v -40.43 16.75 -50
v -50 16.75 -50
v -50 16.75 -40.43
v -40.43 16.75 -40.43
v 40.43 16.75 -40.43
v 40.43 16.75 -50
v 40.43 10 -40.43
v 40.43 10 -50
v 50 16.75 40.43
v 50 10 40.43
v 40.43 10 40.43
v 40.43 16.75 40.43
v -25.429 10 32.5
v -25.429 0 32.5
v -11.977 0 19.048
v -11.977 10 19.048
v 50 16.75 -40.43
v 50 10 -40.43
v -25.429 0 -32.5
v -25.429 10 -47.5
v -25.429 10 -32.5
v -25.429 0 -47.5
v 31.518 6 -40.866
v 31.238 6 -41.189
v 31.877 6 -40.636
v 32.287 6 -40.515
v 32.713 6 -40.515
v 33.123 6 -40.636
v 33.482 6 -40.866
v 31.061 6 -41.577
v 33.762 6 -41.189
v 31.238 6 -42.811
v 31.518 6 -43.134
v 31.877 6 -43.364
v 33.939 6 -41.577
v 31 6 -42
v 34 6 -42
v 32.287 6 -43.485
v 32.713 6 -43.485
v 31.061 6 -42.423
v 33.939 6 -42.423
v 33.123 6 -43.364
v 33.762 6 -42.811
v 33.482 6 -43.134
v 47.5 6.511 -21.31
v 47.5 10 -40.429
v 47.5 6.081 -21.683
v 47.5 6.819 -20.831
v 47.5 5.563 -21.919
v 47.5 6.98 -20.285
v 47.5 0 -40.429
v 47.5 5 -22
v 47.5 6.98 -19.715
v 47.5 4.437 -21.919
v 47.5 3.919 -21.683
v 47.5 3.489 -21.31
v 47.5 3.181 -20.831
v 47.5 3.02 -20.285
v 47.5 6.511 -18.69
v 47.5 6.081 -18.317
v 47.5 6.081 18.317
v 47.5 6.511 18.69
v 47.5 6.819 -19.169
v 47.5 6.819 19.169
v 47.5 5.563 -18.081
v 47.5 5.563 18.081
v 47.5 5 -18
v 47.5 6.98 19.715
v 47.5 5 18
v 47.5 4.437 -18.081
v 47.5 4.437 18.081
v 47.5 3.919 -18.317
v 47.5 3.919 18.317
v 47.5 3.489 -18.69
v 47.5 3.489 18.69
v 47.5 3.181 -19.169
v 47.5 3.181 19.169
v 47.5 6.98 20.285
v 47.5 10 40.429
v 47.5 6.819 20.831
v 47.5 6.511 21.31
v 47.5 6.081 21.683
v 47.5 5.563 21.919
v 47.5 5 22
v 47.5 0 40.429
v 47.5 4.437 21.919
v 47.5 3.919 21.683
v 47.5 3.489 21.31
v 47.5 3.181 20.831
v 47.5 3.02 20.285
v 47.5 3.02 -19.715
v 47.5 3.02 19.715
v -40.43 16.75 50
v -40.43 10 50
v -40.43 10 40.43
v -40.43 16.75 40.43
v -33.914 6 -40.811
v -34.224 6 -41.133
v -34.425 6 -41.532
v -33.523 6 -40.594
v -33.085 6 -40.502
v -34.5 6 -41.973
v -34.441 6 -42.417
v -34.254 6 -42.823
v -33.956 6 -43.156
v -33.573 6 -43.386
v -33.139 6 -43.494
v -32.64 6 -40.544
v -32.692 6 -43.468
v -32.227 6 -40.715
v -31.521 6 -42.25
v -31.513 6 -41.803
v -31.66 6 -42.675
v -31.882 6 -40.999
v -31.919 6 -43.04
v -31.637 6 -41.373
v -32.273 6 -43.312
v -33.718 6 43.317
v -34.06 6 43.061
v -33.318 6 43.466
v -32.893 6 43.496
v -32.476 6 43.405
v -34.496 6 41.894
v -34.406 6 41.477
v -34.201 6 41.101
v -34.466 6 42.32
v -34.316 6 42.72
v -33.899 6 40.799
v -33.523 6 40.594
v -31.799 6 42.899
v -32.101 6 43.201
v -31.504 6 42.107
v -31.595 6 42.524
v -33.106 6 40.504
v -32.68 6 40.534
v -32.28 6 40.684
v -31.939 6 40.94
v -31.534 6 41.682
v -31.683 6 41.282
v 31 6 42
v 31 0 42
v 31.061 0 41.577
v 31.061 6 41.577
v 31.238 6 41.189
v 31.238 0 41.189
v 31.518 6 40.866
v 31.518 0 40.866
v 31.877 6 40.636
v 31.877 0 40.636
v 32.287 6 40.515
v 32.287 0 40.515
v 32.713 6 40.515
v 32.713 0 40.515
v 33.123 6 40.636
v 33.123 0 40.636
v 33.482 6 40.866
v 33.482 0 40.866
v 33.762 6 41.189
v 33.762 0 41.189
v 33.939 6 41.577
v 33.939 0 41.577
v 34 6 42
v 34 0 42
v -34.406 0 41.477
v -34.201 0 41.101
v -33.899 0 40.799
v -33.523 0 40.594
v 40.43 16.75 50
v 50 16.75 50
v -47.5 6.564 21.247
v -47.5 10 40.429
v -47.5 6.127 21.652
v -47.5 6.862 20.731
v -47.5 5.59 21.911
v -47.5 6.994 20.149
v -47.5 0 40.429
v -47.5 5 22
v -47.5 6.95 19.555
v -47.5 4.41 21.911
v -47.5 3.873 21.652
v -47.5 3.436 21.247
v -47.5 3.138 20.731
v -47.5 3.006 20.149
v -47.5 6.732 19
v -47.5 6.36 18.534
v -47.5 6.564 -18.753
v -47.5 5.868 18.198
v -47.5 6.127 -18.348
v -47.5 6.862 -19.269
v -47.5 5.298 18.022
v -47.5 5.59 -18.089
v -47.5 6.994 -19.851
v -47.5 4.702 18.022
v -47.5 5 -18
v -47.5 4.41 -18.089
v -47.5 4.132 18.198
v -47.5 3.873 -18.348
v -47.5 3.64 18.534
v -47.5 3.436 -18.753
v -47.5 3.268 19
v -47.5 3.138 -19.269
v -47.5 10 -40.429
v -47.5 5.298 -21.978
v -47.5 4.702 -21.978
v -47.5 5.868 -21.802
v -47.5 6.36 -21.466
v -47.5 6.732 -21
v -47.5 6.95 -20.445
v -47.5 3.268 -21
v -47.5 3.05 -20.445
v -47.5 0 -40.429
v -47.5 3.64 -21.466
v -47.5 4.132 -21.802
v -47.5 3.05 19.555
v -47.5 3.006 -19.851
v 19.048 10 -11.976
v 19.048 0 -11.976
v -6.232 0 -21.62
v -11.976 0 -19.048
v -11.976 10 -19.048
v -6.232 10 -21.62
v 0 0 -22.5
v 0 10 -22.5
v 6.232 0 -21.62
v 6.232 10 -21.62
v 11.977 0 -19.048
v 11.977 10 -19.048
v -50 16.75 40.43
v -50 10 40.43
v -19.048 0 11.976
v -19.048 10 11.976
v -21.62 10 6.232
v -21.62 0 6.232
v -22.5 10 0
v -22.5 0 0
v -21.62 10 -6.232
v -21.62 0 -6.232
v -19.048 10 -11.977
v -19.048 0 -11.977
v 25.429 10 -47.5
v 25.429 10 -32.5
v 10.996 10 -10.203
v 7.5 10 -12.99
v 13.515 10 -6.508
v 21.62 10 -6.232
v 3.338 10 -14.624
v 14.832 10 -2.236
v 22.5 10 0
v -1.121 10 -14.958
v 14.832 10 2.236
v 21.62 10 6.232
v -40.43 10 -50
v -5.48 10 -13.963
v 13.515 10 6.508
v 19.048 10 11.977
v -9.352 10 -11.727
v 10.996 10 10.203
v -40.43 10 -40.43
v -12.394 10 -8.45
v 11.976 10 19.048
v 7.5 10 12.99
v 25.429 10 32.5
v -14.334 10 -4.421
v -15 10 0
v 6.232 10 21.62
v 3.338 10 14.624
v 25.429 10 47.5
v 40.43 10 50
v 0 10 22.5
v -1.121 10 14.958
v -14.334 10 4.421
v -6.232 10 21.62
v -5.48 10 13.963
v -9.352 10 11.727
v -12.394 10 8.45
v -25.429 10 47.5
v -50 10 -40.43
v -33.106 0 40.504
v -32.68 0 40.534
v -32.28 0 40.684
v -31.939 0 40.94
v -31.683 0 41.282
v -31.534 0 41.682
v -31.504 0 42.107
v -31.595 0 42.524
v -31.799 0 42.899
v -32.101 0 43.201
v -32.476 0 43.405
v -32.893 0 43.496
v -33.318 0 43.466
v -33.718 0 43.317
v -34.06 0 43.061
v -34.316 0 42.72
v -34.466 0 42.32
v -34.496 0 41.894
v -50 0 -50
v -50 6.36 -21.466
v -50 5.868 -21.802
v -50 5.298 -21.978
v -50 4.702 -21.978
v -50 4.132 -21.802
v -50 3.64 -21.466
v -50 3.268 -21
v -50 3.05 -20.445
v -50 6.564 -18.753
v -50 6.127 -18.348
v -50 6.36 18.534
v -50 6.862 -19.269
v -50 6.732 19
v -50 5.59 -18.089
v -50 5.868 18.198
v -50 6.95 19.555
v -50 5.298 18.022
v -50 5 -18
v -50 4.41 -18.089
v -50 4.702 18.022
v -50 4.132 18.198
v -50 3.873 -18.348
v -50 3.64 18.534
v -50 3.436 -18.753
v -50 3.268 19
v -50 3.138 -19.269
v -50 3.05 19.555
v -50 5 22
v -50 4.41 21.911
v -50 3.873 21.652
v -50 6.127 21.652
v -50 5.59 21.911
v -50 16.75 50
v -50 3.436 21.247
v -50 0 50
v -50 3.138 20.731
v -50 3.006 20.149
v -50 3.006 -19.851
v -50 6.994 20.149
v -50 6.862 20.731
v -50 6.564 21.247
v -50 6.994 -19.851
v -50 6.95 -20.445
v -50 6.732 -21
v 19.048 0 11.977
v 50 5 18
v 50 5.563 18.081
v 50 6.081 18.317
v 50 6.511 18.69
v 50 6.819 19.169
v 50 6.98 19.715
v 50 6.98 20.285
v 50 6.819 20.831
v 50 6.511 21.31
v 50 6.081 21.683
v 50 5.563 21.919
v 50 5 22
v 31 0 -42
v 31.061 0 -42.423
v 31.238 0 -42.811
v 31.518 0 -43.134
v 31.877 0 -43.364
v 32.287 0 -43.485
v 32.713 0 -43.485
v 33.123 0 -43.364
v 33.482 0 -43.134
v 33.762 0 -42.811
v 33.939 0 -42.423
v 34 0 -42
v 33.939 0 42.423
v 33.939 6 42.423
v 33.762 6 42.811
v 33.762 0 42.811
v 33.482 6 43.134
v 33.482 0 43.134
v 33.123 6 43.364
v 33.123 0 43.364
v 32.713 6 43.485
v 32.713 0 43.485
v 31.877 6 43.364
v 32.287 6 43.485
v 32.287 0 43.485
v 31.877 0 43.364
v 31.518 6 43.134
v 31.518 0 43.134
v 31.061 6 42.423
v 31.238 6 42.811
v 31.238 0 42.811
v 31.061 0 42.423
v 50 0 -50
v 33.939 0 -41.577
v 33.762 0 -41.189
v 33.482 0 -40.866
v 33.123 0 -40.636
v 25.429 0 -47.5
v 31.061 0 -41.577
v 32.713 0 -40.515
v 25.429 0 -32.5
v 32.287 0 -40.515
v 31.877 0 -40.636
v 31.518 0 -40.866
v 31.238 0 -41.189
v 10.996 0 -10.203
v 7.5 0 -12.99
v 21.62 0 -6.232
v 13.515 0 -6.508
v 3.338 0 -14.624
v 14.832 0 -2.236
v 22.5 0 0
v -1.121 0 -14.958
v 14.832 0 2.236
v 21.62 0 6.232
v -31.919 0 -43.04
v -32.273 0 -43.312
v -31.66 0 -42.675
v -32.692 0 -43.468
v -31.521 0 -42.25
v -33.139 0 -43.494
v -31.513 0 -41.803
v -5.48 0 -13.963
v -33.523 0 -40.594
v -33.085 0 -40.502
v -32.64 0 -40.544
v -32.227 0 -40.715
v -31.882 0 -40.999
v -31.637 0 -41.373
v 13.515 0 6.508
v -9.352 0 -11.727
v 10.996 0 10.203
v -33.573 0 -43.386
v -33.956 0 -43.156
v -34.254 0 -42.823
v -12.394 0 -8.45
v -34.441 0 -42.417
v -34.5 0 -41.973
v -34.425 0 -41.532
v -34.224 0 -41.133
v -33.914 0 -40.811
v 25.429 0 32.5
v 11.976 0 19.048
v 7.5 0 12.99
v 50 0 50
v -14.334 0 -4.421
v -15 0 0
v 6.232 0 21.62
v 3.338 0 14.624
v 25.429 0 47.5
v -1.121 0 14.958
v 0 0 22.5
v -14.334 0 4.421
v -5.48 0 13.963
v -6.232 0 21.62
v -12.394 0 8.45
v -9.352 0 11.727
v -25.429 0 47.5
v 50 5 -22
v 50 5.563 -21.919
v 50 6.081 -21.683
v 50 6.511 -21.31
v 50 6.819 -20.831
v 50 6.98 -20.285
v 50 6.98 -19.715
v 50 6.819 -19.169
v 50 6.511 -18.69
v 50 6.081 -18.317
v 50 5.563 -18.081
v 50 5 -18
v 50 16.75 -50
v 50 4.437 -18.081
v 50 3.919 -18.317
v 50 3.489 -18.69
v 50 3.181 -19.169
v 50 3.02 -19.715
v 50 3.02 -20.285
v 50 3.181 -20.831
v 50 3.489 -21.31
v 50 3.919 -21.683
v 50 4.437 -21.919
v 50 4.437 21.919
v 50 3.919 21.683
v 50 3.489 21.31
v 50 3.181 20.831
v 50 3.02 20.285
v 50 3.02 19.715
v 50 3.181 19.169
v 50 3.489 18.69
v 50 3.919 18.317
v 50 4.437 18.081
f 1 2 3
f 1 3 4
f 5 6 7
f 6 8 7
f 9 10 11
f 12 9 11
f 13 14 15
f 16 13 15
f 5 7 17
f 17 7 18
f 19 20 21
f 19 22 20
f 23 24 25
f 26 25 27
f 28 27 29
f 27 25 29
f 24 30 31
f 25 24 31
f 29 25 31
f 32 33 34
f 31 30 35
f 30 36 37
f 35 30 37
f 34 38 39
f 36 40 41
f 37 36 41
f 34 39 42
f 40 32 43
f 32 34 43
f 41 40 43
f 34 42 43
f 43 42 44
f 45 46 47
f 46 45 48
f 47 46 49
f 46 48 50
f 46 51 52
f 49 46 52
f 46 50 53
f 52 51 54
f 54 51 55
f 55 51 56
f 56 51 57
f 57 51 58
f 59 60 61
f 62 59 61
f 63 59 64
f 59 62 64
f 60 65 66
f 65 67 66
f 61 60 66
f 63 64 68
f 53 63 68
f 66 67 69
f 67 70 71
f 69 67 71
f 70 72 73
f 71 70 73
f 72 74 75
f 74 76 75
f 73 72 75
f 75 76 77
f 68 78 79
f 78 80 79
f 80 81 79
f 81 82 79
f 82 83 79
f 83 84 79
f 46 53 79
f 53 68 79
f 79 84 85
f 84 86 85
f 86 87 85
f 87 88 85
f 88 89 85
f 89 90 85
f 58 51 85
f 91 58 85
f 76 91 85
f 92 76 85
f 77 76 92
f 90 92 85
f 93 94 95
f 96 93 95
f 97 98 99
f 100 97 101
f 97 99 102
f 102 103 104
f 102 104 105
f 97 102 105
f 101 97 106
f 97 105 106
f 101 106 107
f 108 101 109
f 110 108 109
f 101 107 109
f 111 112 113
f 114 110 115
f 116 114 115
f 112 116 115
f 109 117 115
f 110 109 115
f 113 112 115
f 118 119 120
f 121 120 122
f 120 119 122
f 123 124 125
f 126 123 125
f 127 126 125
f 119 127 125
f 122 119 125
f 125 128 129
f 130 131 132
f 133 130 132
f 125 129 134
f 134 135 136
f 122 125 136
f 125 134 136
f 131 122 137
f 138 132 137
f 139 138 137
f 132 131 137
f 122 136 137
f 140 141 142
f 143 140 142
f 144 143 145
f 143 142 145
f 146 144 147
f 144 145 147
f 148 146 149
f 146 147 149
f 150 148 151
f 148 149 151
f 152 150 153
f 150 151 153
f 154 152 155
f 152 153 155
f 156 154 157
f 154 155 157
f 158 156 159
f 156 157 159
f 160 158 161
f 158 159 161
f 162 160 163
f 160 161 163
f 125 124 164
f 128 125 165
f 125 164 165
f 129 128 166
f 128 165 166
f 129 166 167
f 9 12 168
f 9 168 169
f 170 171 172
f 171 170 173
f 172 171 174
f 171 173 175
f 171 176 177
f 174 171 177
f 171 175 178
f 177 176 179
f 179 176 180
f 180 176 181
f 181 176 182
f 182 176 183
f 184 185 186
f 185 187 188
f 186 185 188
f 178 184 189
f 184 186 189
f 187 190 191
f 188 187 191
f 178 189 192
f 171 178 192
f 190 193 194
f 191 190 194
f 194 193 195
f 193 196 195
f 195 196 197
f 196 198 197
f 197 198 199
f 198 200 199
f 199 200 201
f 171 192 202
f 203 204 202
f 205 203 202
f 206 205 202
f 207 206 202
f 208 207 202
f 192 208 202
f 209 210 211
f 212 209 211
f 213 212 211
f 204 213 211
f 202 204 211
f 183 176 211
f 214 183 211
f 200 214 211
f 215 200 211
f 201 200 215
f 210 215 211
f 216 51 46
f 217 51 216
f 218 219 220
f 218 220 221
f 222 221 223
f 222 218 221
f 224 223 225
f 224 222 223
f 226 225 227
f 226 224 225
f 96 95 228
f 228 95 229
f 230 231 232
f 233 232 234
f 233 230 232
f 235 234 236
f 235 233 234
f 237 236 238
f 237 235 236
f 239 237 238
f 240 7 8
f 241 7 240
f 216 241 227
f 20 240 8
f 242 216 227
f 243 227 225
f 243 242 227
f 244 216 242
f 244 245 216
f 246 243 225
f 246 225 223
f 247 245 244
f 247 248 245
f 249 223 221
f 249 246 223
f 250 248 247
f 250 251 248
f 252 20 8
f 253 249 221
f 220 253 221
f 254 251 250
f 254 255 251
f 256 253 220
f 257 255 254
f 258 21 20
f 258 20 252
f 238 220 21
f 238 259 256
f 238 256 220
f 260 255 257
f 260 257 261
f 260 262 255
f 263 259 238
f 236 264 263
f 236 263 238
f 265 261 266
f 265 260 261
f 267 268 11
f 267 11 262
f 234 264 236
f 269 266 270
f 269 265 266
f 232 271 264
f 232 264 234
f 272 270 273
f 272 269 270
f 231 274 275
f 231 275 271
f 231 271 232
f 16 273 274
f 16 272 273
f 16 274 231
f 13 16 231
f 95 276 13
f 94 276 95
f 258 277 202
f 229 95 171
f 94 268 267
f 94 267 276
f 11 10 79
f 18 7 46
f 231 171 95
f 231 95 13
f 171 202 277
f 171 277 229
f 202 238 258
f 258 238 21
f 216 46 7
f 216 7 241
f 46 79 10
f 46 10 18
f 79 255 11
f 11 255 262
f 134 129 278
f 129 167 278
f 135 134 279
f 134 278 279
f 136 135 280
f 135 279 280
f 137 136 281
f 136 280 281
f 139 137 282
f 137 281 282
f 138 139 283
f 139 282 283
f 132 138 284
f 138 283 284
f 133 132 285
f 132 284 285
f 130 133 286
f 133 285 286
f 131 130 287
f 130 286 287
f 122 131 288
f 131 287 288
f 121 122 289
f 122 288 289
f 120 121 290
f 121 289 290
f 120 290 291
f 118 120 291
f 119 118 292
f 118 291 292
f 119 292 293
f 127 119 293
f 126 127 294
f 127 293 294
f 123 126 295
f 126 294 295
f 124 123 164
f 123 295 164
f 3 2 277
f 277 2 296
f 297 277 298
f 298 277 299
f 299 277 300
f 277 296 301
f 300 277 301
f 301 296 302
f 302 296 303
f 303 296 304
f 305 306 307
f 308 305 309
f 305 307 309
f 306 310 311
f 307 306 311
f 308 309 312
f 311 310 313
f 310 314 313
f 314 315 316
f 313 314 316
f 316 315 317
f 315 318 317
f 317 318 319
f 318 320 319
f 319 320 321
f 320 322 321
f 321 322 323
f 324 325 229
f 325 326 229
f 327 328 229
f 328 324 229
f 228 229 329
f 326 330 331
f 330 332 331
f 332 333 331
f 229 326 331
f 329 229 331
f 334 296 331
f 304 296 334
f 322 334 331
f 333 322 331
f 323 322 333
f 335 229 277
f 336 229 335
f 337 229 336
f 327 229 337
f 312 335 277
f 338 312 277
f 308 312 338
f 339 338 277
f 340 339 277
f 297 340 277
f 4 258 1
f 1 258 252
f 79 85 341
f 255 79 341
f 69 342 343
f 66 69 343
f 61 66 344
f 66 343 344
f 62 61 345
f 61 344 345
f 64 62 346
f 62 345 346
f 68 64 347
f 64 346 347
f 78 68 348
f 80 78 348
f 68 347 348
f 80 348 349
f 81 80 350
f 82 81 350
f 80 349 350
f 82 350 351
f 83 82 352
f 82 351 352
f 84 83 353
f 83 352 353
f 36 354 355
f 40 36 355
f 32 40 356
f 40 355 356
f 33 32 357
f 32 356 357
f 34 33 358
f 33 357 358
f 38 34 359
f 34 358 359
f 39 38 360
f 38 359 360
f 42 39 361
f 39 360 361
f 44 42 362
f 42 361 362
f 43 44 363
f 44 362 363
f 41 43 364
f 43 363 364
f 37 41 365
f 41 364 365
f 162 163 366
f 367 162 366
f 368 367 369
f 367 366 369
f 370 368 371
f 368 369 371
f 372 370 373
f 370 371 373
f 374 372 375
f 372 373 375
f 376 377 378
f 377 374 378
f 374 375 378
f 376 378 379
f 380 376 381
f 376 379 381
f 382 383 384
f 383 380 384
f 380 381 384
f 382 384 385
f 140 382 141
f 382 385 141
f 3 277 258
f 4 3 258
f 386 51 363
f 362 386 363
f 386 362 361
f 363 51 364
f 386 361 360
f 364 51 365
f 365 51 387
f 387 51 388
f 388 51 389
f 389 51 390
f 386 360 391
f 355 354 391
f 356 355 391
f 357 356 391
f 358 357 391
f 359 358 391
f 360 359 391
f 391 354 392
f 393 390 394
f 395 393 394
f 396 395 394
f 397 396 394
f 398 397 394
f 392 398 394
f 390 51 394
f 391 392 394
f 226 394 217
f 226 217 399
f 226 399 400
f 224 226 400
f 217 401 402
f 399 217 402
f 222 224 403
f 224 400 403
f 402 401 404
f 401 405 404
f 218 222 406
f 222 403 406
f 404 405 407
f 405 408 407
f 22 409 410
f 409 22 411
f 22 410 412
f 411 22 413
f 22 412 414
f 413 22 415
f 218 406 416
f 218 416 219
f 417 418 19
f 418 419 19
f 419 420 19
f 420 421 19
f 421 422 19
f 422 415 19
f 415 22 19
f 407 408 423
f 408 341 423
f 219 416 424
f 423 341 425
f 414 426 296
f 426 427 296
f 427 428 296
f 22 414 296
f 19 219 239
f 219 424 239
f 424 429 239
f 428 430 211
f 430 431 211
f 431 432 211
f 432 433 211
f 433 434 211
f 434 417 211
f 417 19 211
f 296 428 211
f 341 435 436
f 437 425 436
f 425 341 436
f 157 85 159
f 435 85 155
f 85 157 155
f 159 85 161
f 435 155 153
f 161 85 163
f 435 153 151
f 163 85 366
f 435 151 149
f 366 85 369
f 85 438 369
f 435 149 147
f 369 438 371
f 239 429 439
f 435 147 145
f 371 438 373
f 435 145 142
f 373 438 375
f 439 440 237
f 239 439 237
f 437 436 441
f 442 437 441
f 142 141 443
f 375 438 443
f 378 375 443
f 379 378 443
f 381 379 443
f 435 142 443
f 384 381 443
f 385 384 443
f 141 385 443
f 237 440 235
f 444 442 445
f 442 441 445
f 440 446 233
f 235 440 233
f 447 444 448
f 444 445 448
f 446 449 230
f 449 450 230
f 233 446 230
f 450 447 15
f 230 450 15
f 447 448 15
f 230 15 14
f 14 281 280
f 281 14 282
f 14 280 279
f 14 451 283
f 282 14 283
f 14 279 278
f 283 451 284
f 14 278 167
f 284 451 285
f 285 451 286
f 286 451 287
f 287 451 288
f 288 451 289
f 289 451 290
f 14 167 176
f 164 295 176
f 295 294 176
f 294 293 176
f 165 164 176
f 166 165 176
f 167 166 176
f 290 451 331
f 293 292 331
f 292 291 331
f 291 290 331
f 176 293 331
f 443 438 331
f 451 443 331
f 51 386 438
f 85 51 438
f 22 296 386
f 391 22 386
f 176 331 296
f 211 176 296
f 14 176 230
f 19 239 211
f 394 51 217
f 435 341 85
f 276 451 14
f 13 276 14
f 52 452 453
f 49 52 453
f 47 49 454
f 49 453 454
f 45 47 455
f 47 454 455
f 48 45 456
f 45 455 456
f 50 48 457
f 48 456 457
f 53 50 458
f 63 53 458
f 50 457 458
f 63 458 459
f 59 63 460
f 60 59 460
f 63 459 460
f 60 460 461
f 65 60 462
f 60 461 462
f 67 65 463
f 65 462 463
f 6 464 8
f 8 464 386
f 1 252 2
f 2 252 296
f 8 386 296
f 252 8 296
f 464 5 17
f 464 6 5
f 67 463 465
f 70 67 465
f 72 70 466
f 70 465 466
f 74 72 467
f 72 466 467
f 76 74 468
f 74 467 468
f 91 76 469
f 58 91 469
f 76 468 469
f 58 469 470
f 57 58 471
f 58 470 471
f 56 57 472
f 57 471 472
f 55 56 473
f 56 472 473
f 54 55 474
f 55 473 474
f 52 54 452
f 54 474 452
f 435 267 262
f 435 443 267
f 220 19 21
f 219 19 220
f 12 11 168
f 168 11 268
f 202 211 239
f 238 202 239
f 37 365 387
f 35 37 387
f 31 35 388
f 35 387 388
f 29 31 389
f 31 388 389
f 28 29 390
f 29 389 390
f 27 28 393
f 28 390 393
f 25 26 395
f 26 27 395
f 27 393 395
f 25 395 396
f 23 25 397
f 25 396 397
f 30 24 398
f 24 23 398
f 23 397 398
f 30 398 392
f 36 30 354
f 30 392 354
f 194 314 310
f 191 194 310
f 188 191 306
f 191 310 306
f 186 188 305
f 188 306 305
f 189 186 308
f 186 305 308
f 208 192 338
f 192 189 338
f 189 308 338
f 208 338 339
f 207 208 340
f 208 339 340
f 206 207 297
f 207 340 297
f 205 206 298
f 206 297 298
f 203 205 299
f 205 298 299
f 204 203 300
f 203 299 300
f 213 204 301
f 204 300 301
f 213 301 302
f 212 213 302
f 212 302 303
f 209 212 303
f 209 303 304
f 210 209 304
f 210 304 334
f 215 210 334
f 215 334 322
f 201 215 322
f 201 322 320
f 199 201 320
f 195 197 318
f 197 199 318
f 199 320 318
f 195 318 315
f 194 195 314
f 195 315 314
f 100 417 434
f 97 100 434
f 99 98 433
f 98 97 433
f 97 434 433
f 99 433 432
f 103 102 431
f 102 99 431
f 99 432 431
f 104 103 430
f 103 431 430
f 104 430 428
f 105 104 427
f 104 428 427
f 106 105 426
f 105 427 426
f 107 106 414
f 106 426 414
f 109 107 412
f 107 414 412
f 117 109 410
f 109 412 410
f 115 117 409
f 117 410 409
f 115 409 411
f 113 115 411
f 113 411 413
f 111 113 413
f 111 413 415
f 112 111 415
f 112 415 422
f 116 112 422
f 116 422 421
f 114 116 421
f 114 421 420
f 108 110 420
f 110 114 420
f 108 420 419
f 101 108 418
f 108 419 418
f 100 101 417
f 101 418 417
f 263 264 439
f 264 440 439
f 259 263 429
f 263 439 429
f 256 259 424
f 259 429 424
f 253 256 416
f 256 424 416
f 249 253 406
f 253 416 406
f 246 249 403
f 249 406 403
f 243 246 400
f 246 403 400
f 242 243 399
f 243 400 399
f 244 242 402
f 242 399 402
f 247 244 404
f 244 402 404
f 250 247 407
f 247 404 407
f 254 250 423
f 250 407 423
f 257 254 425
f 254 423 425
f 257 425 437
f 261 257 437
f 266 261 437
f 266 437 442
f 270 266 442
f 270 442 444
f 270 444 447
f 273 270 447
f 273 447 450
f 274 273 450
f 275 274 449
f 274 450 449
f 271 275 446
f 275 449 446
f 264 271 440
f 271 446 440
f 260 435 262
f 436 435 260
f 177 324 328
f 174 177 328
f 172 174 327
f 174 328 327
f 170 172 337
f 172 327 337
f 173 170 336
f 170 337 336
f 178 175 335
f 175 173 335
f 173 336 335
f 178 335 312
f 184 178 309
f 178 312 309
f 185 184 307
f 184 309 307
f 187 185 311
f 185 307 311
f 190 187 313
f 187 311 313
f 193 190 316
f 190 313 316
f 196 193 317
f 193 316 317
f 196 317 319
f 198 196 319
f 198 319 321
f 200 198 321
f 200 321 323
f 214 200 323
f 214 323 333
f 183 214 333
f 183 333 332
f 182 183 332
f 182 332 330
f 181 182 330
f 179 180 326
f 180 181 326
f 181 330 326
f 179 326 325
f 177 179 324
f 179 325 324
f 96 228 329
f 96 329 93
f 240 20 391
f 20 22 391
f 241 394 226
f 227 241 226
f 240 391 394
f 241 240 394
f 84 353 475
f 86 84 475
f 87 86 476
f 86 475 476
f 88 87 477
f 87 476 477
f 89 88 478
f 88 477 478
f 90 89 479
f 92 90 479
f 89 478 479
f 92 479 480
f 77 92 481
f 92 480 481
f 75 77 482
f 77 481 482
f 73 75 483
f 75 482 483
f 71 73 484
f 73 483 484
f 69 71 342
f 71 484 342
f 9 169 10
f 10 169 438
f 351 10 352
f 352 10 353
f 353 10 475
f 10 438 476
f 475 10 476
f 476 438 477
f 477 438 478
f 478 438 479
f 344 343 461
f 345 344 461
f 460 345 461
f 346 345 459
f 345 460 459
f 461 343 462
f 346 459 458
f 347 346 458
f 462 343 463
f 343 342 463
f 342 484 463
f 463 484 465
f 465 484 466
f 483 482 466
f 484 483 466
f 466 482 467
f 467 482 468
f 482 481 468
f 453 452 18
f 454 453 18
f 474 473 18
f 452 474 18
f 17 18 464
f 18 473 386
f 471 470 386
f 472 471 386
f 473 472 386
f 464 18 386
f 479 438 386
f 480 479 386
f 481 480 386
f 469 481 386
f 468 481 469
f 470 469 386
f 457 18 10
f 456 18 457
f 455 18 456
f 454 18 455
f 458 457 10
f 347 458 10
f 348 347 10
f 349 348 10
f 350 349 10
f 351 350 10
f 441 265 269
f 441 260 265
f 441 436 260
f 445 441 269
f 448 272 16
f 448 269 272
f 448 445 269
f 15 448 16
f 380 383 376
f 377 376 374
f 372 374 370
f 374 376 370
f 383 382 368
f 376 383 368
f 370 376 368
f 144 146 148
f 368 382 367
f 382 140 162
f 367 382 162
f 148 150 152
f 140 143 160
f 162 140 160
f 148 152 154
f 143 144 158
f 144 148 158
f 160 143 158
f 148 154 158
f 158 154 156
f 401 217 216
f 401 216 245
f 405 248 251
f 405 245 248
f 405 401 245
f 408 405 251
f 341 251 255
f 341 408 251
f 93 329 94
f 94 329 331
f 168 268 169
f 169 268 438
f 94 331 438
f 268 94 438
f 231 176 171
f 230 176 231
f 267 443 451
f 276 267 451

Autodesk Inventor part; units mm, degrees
ref_plane "YZ Plane" through (0, 0, 0) normal (1, 0, 0) x (0, 1, 0)
ref_plane "XZ Plane" through (0, 0, 0) normal (0, 1, 0) x (-1, 0, 0)
ref_plane "XY Plane" through (0, 0, 0) normal (0, 0, 1) x (1, 0, 0)
sketch "Sketch1" plane through (0, 0, 0) normal (0, 1, 0) x (-1, 0, 0)
  line L0 (50, 50) -> (-50, 50)
  line L1 (-50, 50) -> (-50, -50)
  line L2 (-50, -50) -> (50, -50)
  line L3 (50, -50) -> (50, 50)
  line L4 (-50, 50) -> (50, -50) construction
  line L5 (-47.5, 47.5) -> (47.5, 47.5)
  line L6 (47.5, 47.5) -> (47.5, -47.5)
  line L7 (47.5, -47.5) -> (-47.5, -47.5)
  line L8 (-47.5, -47.5) -> (-47.5, 47.5)
  line L9 (-47.5, 47.5) -> (47.5, -47.5) construction
  circle A0 centre (0, 0) radius 22.5
  circle A1 centre (0, 0) radius 15
  line L10 (40.4289, 47.5) -> (11.9766, 19.0476)
  line L11 (47.5, 40.4289) -> (19.0476, 11.9765)
  line L12 (-47.5, 40.4289) -> (-19.0476, 11.9766)
  line L13 (-40.4289, 47.5) -> (-11.9765, 19.0476)
  line L14 (-40.4289, -47.5) -> (-11.9766, -19.0476)
  line L15 (-47.5, -40.4289) -> (-19.0476, -11.9765)
  line L16 (47.5, -40.4289) -> (19.0476, -11.9766)
  line L17 (40.4289, -47.5) -> (11.9765, -19.0476)
  circle A2 centre (35, -35) radius 2
  circle A3 centre (35, 35) radius 2
  circle A4 centre (-35, 35) radius 2
  circle A5 centre (-35, -35) radius 2
  point P0 (19.0476, -11.9766)
  point P1 (-11.9765, 19.0476)
  point P2 (-11.9766, -19.0476)
  point P3 (11.9765, -19.0476)
  dimension "d0" = 100
  dimension "d1" = 100
  dimension "d2" = 95
  dimension "d3" = 95
  dimension "d9" = 30
  dimension "d10" = 7.5
  dimension "d11" = 10
  dimension "d12" = 7.0711
  dimension "d13" = 7.0711
  dimension "d16" = 360
  dimension "d23" = 4
  dimension "d24" = 35
  dimension "d27" = 360
extrude "Extrusion1" add sketch "Sketch1" along normal blind 10 contours L3 L2 L1 L0 | L5 L13 A0 L12 L8 | L5 L6 L11 A0 L10 | A0 | L15 A0 L14 L7 L8 | L6 L7 L17 A0 L16 | A2 | A3 | A4 | A5
sketch "Sketch3" plane through (0, 10, 0) normal (0, 1, 0) x (1, 0, 0)
  line L0 (-50, -50) -> (-40.43, -50)
  line L1 (-40.43, -50) -> (-40.43, -40.43)
  line L2 (-40.43, -40.43) -> (-50, -40.43)
  line L3 (-50, -40.43) -> (-50, -50)
  line L4 (40.43, -40.43) -> (40.43, -50)
  line L5 (40.43, -50) -> (50, -50)
  line L6 (50, -40.43) -> (40.43, -40.43)
  line L7 (50, -50) -> (50, -40.43)
  line L8 (40.43, 40.43) -> (50, 40.43)
  line L9 (50, 40.43) -> (50, 50)
  line L10 (40.43, 50) -> (40.43, 40.43)
  line L11 (50, 50) -> (40.43, 50)
  line L12 (-40.43, 40.43) -> (-40.43, 50)
  line L13 (-40.43, 50) -> (-50, 50)
  line L14 (-50, 40.43) -> (-40.43, 40.43)
  line L15 (-50, 50) -> (-50, 40.43)
  point P0 (0, 0)
  dimension "d29" = 9.57
  dimension "d30" = 9.57
  dimension "d33" = 360
extrude "Extrusion2" add sketch "Sketch3" along normal blind 6.75
sketch "Sketch4" plane through (-50, 0, -50) normal (-1, 0, 0) x (0, 0, 1)
  circle A0 centre (30, 5) radius 2
  line L0 (0, 0) -> (0, 16.75) projected
  circle A1 centre (70, 5) radius 2
  line L1 (100, 0) -> (100, 16.75) projected
  point P0 (50, 0)
  dimension "d37" = 4
  dimension "d38" = 30
  dimension "d39" = 4
  dimension "d40" = 30
extrude "Extrusion3" cut sketch "Sketch4" against normal blind 6.75
sketch "Sketch5" plane through (50, 0, 50) normal (1, 0, 0) x (0, 0, -1)
  circle A0 centre (30, 5) radius 2
  line L0 (0, 0) -> (0, 16.75) projected
  circle A1 centre (70, 5) radius 2
  line L1 (100, 0) -> (100, 16.75) projected
  point P0 (50, 0)
  dimension "d43" = 4
  dimension "d44" = 30
  dimension "d45" = 4
  dimension "d46" = 30
extrude "Extrusion4" cut sketch "Sketch5" against normal blind 6.75
sketch "Sketch6" plane through (0, 0, 0) normal (0, -1, 0) x (1, 0, 0)
  line L0 (35, 45) -> (-35, 45)
  line L1 (-35, 45) -> (-35, -45)
  line L2 (-35, -45) -> (35, -45)
  line L3 (35, -45) -> (35, 45)
  line L4 (35, 45) -> (-35, -45) construction
  line L5 (-35, 45) -> (35, -45) construction
  line L6 (40.4289, 47.5) -> (25.4289, 47.5)
  line L7 (40.4289, 47.5) -> (-40.4289, 47.5) projected
  line L8 (25.4289, 47.5) -> (25.4289, 32.5)
  line L9 (25.4289, 32.5) -> (40.4289, 47.5)
  line L10 (40.4289, -47.5) -> (11.9766, -19.0476) projected
  line L11 (40.4289, -47.5) -> (25.4289, -47.5)
  line L12 (-40.4289, -47.5) -> (40.4289, -47.5) projected
  line L13 (-40.4289, 47.5) -> (-25.4289, 47.5)
  line L14 (-40.4289, -47.5) -> (-25.4289, -47.5)
  circle A0 centre (32.5, 42) radius 1.5
  circle A1 centre (32.5, -42) radius 1.5
  circle A2 centre (-33, -42) radius 1.5
  circle A3 centre (-33, 42) radius 1.5
  line L15 (-40.4289, -47.5) -> (-25.4289, -47.5)
  line L16 (-25.4289, -47.5) -> (-25.4289, -32.5)
  line L17 (-25.4289, -32.5) -> (-40.4289, -47.5)
  line L18 (-40.4289, 47.5) -> (-25.4289, 47.5)
  line L19 (-40.4289, 47.5) -> (-25.4289, 47.5)
  line L20 (-40.4289, 47.5) -> (-25.4289, 47.5) construction
  line L21 (-25.4289, 47.5) -> (-25.4289, 32.5)
  line L22 (-25.4289, 32.5) -> (-40.4289, 47.5)
  line L23 (25.4289, -47.5) -> (25.4289, -32.5)
  line L24 (25.4289, -47.5) -> (40.4289, -47.5) construction
  line L25 (25.4289, -32.5) -> (40.4289, -47.5)
  point P0 (0, 0)
  point P1 (-34.4058, -41.4769)
  point P2 (-33.5231, -40.5942)
  point P3 (-33.5231, 40.5942)
  point P4 (-34.4058, 41.4769)
  dimension "d49" = 70
  dimension "d50" = 90
  dimension "d51" = 15
  dimension "d52" = 15
  dimension "d53" = 90
  dimension "d54" = 15
  dimension "d56" = 15
  dimension "d58" = 15
  dimension "d59" = 3
  dimension "d60" = 2.5
  dimension "d61" = 3
  dimension "d62" = 3
  dimension "d63" = 3
  dimension "d64" = 2.5
  dimension "d65" = 3
  dimension "d66" = 3
  dimension "d67" = 2
  dimension "d68" = 3
  dimension "d69" = 3
  dimension "d70" = 2
  dimension "d71" = 15
  dimension "d72" = 15
  dimension "d73" = 0
  dimension "d74" = 15
  dimension "d75" = 90
  dimension "d76" = 15
  dimension "d77" = 90
extrude "Extrusion5" cut sketch "Sketch6" against normal blind 10 contours A3 L22 | A2 L17 picked at (-33.9131, 40.9363) picked at (-33.9131, -40.9363)
extrude "Extrusion6" add sketch "Sketch6" against normal blind 10 contours L3 L9 L8 L0 | L0 L8 L6 L9 L3 | L21 L22 A3 L1 L0 | L0 L1 L22 L7 L21 | L10 L11 L23 L2 L3 | L3 L2 L23 L10 | L17 A2 L16 L2 L1 | L1 L2 L16 L12 L17
sketch "Sketch8" plane through (0, 10, 0) normal (0, 1, 0) x (1, 0, 0)
  circle A0 centre (-33, 42) radius 1.5 projected
  circle A1 centre (-33, 42) radius 1.5
  circle A2 centre (32.5, 42) radius 1.5 projected
  circle A3 centre (32.5, 42) radius 1.5
  circle A4 centre (32.5, -42) radius 1.5 projected
  circle A5 centre (32.5, -42) radius 1.5
  circle A6 centre (-33, -42) radius 1.5
  point P0 (0, 0)
extrude "Extrusion7" add sketch "Sketch8" against normal blind 4
equation "\"d18\" = d11"
properties part number "Top&Bottom"
